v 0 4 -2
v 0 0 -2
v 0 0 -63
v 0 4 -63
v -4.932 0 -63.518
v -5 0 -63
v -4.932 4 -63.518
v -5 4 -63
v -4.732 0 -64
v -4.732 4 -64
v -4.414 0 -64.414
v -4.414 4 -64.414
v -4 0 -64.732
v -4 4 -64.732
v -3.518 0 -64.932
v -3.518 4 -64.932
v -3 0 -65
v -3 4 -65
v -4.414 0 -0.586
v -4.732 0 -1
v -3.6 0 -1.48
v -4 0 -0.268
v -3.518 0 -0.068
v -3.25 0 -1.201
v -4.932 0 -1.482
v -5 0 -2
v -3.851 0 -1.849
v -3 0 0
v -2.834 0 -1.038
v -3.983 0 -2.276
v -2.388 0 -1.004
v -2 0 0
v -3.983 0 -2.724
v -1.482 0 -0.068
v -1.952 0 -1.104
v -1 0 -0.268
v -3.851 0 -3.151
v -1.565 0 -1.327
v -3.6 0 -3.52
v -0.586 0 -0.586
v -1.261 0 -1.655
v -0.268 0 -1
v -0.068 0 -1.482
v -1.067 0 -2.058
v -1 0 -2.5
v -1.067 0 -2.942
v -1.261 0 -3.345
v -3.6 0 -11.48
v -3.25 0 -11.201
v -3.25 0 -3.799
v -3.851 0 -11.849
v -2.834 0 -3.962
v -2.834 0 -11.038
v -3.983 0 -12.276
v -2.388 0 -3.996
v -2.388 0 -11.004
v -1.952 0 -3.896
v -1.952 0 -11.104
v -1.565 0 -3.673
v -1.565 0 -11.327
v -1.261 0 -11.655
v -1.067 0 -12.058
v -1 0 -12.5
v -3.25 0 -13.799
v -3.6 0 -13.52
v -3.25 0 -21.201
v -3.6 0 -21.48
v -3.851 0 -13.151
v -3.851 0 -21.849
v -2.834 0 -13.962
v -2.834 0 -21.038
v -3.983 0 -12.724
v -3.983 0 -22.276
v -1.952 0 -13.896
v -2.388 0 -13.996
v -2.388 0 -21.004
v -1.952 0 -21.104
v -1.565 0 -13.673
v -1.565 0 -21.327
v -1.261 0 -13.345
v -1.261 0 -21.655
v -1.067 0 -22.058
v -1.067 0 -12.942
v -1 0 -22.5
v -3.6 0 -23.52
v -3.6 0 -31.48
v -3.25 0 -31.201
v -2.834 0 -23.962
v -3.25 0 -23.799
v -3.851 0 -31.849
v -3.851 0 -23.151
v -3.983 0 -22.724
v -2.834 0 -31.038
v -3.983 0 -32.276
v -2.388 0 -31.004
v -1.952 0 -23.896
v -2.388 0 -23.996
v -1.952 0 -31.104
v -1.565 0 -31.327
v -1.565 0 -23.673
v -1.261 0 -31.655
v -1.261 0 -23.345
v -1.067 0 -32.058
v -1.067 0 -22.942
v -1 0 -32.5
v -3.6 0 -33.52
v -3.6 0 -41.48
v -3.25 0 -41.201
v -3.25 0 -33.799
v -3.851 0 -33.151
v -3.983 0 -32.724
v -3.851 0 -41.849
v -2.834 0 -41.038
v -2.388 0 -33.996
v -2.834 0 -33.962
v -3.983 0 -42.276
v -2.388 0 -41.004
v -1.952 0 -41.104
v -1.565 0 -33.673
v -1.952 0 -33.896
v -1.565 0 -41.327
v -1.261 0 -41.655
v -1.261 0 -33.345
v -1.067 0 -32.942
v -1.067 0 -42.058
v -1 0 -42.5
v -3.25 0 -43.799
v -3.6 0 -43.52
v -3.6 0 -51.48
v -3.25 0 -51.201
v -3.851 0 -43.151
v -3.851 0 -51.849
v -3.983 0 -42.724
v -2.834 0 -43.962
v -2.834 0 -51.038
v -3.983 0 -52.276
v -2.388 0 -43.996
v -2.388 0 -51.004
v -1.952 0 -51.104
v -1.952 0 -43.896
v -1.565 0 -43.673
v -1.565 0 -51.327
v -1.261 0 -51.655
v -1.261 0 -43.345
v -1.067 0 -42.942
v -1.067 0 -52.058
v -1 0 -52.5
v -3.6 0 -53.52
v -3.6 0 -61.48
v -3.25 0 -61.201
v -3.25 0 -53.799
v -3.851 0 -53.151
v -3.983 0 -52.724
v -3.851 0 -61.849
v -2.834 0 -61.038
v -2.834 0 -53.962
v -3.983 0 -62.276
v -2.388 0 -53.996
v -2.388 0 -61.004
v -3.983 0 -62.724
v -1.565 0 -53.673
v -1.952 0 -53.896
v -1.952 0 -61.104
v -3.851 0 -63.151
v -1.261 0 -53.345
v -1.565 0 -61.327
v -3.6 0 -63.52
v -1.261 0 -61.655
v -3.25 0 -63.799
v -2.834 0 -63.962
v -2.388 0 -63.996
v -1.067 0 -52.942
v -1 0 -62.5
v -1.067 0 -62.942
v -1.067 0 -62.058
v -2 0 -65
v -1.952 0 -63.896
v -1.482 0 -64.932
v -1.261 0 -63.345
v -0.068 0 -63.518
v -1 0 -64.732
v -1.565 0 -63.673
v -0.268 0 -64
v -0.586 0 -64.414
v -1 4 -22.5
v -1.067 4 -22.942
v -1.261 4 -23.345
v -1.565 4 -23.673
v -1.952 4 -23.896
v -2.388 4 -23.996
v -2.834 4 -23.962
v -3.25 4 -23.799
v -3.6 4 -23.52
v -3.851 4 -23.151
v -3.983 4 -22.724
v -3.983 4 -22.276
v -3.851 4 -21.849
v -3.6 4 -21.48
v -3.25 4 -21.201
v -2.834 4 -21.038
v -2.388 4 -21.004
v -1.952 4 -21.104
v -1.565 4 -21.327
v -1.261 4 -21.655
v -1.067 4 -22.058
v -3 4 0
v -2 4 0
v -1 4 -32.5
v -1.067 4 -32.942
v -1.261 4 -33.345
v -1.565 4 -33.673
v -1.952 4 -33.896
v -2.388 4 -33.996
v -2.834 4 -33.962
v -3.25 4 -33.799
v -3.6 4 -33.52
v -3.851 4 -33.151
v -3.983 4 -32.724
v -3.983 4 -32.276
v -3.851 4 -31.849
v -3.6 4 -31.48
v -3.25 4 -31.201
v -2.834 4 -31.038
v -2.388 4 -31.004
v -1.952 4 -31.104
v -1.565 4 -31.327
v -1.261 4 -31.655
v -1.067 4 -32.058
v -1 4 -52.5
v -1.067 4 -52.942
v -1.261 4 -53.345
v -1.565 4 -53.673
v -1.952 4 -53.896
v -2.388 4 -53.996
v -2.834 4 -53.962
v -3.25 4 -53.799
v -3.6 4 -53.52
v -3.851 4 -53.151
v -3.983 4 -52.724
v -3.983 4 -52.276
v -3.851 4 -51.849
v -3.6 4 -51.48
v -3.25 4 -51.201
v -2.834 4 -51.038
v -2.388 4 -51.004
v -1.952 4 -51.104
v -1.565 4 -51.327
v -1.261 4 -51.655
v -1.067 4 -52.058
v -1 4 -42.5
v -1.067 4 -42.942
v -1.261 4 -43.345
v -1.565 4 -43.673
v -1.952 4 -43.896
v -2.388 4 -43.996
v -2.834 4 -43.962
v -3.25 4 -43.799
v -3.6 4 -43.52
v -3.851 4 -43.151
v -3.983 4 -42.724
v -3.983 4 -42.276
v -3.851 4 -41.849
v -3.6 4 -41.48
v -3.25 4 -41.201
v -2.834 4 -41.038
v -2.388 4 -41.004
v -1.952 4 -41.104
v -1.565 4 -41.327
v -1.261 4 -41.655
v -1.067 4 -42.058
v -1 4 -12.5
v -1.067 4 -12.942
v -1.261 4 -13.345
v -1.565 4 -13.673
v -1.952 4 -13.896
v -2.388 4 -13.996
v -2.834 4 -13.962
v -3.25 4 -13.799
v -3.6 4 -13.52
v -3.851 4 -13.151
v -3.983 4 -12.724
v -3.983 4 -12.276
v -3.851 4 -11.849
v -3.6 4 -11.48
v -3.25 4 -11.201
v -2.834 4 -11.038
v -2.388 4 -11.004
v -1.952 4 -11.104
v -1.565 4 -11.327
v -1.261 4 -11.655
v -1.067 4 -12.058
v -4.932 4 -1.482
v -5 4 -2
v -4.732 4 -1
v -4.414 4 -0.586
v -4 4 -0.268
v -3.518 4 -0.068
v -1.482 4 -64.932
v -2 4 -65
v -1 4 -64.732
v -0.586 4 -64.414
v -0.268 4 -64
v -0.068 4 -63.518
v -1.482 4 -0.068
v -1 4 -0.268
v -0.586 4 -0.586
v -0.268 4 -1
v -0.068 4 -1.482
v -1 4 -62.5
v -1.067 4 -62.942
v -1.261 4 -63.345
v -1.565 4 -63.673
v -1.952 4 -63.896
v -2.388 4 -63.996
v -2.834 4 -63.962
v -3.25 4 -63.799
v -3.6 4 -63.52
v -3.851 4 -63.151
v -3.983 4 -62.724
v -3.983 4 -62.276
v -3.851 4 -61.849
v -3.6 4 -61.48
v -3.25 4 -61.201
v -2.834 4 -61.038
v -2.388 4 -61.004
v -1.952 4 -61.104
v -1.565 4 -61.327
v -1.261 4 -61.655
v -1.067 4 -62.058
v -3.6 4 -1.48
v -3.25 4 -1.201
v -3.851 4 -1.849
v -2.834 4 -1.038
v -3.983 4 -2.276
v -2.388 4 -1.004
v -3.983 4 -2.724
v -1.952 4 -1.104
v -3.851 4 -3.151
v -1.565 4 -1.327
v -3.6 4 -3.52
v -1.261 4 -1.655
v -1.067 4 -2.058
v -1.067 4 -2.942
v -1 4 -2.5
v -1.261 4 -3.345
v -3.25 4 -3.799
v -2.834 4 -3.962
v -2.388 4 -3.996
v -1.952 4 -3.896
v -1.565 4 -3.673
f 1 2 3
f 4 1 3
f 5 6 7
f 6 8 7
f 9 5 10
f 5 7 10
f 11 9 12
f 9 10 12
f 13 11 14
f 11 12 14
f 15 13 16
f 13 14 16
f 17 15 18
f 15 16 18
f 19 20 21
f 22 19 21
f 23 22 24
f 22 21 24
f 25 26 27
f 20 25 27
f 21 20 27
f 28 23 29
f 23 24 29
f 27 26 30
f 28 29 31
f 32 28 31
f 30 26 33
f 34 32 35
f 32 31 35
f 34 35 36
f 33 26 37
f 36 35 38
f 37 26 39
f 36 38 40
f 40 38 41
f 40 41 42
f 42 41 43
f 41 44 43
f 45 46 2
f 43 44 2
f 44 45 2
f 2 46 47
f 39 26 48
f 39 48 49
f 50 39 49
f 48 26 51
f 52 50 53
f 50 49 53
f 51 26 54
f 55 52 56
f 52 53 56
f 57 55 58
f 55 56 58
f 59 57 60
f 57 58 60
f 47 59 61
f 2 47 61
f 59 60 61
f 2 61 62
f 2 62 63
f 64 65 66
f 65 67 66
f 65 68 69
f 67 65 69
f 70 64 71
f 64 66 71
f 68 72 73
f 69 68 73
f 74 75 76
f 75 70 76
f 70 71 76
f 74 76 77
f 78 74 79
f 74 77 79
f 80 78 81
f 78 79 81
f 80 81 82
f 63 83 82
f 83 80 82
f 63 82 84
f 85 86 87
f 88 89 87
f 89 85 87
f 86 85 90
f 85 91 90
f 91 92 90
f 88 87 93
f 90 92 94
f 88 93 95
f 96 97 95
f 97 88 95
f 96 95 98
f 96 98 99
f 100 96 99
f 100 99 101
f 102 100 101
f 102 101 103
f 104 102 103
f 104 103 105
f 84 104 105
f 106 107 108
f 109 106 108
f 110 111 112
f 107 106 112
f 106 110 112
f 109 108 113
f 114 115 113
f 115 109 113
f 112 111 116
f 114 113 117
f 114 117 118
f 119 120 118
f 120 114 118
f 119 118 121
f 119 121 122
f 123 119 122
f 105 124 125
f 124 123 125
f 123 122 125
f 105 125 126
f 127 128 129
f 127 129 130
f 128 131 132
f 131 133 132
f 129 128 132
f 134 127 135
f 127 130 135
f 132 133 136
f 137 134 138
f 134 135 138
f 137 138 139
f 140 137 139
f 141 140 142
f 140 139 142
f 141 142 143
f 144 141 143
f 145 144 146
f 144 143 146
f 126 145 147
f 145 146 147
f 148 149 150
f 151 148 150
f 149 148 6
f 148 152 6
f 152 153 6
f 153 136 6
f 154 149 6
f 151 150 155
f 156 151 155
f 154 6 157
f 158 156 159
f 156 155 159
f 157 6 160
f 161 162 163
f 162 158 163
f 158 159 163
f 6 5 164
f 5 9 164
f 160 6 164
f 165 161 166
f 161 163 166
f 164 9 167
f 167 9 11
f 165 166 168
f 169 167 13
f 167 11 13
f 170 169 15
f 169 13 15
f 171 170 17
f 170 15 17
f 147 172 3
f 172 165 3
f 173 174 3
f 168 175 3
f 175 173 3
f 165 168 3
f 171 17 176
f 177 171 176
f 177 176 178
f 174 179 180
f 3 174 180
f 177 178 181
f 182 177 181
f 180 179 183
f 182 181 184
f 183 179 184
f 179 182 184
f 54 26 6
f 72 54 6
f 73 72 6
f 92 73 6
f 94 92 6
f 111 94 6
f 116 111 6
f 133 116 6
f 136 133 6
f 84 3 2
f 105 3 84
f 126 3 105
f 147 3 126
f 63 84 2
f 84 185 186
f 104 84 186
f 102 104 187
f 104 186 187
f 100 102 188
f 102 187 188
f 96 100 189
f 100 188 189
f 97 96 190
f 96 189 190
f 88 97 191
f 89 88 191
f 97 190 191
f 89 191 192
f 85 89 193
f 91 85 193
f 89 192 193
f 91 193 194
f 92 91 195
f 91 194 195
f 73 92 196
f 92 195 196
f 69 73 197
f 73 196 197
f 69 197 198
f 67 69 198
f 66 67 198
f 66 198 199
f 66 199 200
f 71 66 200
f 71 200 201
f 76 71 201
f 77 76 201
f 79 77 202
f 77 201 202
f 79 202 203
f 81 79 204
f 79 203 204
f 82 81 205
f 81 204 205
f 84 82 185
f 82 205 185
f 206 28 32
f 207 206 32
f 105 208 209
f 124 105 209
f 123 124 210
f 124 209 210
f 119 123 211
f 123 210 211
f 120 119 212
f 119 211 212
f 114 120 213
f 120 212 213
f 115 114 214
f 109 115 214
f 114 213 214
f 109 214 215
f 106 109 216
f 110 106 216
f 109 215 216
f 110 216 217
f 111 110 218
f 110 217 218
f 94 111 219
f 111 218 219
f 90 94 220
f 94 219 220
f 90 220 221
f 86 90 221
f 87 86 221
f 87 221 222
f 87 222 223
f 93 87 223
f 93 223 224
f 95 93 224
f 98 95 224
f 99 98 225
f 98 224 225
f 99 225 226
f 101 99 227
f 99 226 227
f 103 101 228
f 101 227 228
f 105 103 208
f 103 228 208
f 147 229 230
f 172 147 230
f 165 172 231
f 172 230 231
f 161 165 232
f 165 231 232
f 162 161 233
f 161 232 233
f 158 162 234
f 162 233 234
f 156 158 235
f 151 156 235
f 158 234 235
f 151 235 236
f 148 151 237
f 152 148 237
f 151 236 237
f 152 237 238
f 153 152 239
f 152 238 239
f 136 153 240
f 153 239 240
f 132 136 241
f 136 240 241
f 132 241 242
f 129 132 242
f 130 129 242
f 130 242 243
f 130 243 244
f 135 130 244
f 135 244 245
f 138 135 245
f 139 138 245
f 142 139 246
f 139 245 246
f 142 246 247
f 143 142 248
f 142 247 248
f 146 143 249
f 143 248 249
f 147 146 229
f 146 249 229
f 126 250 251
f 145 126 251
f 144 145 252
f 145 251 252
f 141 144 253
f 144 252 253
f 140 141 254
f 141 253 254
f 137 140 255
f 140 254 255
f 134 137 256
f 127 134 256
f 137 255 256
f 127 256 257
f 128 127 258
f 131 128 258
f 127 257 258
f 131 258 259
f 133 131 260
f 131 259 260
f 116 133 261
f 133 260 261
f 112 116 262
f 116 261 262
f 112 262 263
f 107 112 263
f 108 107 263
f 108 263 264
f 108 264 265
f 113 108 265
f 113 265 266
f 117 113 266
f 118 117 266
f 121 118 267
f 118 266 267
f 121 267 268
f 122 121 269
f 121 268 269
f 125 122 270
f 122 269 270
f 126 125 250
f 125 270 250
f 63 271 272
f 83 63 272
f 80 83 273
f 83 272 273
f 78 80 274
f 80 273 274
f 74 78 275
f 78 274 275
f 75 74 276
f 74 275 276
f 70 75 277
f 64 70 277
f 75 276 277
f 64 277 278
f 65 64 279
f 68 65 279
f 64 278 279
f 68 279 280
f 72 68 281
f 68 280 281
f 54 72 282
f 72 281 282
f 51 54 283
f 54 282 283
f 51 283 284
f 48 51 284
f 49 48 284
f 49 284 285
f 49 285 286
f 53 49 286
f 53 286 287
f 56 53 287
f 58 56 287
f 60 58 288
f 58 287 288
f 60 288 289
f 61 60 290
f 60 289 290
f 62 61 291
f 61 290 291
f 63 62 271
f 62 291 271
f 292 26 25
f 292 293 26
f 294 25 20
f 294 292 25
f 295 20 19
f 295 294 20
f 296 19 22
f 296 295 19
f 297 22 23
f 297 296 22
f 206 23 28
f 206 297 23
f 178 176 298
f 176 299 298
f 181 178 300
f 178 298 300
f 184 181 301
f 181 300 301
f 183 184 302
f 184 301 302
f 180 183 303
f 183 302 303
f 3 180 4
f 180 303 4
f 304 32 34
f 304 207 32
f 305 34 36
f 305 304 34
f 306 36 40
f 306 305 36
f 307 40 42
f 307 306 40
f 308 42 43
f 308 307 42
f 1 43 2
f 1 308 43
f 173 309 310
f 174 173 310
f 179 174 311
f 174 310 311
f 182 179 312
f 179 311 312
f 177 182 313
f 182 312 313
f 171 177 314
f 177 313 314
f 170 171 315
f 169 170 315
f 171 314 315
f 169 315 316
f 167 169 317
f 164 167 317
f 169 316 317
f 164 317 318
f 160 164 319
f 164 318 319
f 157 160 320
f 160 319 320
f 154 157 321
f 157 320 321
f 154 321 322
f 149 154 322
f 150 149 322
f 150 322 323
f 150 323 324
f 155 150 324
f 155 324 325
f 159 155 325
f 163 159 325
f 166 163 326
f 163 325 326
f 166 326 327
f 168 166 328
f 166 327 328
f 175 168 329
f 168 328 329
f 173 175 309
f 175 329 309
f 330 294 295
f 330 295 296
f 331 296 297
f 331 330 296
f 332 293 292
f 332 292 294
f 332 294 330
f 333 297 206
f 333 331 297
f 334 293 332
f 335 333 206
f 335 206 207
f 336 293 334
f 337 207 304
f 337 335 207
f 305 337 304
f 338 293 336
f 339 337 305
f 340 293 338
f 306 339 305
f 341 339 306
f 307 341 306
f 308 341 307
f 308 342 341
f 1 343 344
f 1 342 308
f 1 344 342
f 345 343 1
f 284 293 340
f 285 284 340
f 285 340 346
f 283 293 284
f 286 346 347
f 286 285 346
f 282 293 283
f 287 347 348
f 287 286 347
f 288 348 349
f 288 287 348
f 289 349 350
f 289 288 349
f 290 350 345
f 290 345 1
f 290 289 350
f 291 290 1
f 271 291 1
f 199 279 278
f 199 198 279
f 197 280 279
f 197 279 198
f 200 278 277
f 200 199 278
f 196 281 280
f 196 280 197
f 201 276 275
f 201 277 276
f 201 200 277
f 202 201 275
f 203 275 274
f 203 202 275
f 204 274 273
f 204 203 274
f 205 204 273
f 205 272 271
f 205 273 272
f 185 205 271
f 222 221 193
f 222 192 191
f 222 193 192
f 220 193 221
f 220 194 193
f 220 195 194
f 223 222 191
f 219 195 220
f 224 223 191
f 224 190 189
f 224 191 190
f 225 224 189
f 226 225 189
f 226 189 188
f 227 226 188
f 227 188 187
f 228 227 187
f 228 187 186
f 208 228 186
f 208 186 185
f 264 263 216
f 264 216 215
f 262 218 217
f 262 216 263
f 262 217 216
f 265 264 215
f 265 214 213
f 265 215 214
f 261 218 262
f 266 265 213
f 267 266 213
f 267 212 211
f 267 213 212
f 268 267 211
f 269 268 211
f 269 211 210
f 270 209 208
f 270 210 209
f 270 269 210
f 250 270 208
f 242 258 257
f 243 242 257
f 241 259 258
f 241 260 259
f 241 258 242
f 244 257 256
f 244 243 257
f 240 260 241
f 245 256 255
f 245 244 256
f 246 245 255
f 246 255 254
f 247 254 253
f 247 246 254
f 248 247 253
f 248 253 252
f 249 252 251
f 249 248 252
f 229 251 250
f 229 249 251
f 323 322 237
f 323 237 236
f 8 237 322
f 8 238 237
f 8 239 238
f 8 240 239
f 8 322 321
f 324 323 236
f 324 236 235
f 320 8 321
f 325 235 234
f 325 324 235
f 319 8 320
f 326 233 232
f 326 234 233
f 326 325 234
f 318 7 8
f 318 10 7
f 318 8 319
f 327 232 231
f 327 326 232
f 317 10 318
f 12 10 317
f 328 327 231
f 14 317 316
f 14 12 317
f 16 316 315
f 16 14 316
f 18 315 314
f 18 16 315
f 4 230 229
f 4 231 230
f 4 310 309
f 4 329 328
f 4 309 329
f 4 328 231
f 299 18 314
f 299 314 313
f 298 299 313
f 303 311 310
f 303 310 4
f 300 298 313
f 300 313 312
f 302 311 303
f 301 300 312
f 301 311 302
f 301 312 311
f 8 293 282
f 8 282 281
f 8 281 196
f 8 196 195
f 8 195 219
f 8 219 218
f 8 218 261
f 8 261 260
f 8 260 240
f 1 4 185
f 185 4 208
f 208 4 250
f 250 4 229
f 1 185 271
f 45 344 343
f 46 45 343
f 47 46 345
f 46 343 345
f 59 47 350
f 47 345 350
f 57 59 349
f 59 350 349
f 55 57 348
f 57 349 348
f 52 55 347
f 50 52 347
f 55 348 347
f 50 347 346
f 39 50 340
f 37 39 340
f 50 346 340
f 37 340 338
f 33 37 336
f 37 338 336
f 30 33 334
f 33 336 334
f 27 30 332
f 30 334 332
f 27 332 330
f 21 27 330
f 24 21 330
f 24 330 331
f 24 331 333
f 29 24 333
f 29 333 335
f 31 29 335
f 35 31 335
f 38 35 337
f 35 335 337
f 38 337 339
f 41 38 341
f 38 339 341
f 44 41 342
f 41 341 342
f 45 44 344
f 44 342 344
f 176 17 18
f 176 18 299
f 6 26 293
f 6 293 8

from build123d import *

# Parameters (mm, degrees)
SKETCH2_W           = 5
SKETCH2_H           = 65
BOSS_EXTRUDE1_DEPTH = 4
SKETCH3_R           = 1.5
CUT_EXTRUDE1_DEPTH  = 4
FILLET2_R           = 2


with BuildPart() as part:
    # Sketch2 → Boss-Extrude1 (new body)
    with BuildSketch(Plane(origin=(0, 0, 0), x_dir=(1, 0, 0), z_dir=(0, 1, 0))):
        with Locations((-2.5, 32.5)):
            Rectangle(SKETCH2_W, SKETCH2_H)
    extrude(amount=BOSS_EXTRUDE1_DEPTH)

    # Sketch3 → Cut-Extrude1 (cut)
    with BuildSketch(Plane(origin=(0, 4, 0), x_dir=(1, 0, 0), z_dir=(0, 1, 0))):
        with Locations((-2.5, 32.5)):
            Circle(SKETCH3_R)
        with Locations((-2.5, 22.5)):
            Circle(SKETCH3_R)
        with Locations((-2.5, 12.5)):
            Circle(SKETCH3_R)
        with Locations((-2.5, 2.5)):
            Circle(SKETCH3_R)
        with Locations((-2.5, 42.5)):
            Circle(SKETCH3_R)
        with Locations((-2.5, 52.5)):
            Circle(SKETCH3_R)
        with Locations((-2.5, 62.5)):
            Circle(SKETCH3_R)
    extrude(amount=-CUT_EXTRUDE1_DEPTH, mode=Mode.SUBTRACT)

    # Fillet2
    fillet2_edges = [part.edges().sort_by_distance(p)[0] for p in [
        (0, 2, 0),
        (0, 2, -65),
        (-5, 2, -65),
        (-5, 2, 0),
    ]]
    fillet(fillet2_edges, radius=FILLET2_R)


solid = part.part
